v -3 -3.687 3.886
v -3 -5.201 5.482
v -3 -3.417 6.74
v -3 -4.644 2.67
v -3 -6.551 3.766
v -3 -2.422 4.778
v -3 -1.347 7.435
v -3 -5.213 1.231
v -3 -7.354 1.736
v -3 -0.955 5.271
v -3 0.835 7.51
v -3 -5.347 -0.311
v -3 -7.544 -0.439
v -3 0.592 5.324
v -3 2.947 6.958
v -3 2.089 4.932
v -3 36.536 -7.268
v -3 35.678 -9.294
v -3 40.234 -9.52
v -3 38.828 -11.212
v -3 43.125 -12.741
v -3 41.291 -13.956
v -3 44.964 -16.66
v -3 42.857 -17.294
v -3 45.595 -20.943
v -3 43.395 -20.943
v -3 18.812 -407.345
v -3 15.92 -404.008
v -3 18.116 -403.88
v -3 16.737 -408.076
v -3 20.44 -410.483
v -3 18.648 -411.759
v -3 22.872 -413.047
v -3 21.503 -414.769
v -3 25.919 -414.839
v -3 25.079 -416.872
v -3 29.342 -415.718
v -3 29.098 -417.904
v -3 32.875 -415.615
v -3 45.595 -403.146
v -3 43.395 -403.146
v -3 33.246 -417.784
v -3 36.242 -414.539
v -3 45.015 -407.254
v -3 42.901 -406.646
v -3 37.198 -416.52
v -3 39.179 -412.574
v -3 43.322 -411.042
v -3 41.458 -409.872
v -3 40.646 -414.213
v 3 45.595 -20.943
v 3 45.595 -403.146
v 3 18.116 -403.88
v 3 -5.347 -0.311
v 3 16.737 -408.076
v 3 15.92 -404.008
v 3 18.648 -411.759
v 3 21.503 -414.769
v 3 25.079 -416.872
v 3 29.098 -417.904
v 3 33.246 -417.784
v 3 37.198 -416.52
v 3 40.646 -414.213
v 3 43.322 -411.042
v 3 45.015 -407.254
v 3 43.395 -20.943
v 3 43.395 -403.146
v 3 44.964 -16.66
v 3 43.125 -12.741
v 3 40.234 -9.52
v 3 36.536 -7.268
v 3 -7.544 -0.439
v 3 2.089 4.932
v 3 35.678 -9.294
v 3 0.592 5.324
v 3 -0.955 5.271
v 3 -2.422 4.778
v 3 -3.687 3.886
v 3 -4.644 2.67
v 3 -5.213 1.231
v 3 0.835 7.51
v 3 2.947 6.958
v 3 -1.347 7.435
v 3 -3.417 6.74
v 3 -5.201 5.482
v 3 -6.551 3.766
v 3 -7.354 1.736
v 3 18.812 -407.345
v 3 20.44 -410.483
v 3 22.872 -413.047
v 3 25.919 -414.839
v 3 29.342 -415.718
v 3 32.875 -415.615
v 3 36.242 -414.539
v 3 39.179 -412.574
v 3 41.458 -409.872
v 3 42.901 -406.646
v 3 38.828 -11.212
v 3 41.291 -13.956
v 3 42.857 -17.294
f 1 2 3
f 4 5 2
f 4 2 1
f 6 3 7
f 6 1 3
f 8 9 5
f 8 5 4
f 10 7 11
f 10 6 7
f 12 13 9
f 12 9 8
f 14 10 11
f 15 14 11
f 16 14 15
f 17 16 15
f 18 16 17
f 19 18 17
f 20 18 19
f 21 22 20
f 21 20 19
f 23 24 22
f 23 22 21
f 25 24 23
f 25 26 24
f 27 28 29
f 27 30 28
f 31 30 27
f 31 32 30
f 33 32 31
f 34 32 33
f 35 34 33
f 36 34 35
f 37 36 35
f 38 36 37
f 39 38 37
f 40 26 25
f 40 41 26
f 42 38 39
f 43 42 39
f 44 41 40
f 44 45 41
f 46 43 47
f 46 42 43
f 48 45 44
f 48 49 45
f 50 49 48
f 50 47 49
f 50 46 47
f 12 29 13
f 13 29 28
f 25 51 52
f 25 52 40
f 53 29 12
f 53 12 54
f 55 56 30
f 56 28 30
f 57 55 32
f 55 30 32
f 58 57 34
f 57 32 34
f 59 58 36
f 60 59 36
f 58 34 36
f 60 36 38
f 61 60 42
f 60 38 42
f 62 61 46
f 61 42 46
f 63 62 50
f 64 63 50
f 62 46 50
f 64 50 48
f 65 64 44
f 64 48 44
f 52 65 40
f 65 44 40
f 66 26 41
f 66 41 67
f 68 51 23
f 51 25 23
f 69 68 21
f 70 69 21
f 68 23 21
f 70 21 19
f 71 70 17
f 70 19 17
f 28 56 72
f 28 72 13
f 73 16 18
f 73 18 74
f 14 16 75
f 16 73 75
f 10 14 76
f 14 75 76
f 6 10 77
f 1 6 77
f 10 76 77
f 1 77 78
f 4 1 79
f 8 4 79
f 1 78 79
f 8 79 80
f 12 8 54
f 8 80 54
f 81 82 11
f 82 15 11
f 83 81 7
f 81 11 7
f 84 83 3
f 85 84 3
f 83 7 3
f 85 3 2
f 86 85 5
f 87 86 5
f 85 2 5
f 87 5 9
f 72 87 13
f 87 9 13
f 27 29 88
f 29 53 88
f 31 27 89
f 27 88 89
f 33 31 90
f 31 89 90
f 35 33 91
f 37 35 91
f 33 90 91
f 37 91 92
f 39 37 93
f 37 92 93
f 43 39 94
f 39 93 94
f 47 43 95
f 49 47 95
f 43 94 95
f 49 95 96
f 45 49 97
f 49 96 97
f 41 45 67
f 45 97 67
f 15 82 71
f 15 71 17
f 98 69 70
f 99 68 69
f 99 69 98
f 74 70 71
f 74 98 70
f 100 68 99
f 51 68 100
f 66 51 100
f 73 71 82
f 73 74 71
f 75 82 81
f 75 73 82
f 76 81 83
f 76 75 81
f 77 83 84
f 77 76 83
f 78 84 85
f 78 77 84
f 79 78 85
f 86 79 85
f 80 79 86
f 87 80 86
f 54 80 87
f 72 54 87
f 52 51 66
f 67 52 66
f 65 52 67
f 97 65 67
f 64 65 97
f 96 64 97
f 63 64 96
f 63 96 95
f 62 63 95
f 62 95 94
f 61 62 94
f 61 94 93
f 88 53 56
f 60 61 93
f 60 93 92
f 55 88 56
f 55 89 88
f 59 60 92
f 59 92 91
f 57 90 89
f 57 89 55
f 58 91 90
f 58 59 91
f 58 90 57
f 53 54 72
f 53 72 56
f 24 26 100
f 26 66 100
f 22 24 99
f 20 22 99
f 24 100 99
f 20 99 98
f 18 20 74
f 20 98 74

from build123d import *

# Parameters (mm, degrees)
SKETCH3_W = 6
SKETCH3_H = 2.2


with BuildPart() as part:
    # Sweep1: sweep along a path in Sketch1
    with BuildLine(Plane(origin=(0, 0, 0), x_dir=(0, 0, -1), z_dir=(1, 0, 0))) as sweep1_path:
        Line((0.31090006, -5.3474047), (403.879965212, 18.116247973))
        ThreePointArc((403.879965212, 18.116247973), (415.790396806, 31.112194288), (403.14572952, 43.394921614))
        Line((403.14572952, 43.394921614), (20.942535542, 43.394921614))
        ThreePointArc((20.942535542, 43.394921614), (13.956361094, 41.290814966), (9.294242947, 35.678457834))
        Line((9.294242947, 35.678457834), (-4.932278427, 2.089024985))
        ThreePointArc((-4.932278427, 2.089024985), (-4.377716999, -3.086582212), (0.31090006, -5.3474047))
    # Sketch3 → Sweep1 (sweep)
    with BuildSketch(Plane(origin=(0, 2.089024985, 4.932278427), x_dir=(1, 0, 0), z_dir=(0, -0.920813644, 0.390002863))):
        with Locations((0, 1.1)):
            Rectangle(SKETCH3_W, SKETCH3_H)
    sweep(path=sweep1_path.line)


solid = part.part
